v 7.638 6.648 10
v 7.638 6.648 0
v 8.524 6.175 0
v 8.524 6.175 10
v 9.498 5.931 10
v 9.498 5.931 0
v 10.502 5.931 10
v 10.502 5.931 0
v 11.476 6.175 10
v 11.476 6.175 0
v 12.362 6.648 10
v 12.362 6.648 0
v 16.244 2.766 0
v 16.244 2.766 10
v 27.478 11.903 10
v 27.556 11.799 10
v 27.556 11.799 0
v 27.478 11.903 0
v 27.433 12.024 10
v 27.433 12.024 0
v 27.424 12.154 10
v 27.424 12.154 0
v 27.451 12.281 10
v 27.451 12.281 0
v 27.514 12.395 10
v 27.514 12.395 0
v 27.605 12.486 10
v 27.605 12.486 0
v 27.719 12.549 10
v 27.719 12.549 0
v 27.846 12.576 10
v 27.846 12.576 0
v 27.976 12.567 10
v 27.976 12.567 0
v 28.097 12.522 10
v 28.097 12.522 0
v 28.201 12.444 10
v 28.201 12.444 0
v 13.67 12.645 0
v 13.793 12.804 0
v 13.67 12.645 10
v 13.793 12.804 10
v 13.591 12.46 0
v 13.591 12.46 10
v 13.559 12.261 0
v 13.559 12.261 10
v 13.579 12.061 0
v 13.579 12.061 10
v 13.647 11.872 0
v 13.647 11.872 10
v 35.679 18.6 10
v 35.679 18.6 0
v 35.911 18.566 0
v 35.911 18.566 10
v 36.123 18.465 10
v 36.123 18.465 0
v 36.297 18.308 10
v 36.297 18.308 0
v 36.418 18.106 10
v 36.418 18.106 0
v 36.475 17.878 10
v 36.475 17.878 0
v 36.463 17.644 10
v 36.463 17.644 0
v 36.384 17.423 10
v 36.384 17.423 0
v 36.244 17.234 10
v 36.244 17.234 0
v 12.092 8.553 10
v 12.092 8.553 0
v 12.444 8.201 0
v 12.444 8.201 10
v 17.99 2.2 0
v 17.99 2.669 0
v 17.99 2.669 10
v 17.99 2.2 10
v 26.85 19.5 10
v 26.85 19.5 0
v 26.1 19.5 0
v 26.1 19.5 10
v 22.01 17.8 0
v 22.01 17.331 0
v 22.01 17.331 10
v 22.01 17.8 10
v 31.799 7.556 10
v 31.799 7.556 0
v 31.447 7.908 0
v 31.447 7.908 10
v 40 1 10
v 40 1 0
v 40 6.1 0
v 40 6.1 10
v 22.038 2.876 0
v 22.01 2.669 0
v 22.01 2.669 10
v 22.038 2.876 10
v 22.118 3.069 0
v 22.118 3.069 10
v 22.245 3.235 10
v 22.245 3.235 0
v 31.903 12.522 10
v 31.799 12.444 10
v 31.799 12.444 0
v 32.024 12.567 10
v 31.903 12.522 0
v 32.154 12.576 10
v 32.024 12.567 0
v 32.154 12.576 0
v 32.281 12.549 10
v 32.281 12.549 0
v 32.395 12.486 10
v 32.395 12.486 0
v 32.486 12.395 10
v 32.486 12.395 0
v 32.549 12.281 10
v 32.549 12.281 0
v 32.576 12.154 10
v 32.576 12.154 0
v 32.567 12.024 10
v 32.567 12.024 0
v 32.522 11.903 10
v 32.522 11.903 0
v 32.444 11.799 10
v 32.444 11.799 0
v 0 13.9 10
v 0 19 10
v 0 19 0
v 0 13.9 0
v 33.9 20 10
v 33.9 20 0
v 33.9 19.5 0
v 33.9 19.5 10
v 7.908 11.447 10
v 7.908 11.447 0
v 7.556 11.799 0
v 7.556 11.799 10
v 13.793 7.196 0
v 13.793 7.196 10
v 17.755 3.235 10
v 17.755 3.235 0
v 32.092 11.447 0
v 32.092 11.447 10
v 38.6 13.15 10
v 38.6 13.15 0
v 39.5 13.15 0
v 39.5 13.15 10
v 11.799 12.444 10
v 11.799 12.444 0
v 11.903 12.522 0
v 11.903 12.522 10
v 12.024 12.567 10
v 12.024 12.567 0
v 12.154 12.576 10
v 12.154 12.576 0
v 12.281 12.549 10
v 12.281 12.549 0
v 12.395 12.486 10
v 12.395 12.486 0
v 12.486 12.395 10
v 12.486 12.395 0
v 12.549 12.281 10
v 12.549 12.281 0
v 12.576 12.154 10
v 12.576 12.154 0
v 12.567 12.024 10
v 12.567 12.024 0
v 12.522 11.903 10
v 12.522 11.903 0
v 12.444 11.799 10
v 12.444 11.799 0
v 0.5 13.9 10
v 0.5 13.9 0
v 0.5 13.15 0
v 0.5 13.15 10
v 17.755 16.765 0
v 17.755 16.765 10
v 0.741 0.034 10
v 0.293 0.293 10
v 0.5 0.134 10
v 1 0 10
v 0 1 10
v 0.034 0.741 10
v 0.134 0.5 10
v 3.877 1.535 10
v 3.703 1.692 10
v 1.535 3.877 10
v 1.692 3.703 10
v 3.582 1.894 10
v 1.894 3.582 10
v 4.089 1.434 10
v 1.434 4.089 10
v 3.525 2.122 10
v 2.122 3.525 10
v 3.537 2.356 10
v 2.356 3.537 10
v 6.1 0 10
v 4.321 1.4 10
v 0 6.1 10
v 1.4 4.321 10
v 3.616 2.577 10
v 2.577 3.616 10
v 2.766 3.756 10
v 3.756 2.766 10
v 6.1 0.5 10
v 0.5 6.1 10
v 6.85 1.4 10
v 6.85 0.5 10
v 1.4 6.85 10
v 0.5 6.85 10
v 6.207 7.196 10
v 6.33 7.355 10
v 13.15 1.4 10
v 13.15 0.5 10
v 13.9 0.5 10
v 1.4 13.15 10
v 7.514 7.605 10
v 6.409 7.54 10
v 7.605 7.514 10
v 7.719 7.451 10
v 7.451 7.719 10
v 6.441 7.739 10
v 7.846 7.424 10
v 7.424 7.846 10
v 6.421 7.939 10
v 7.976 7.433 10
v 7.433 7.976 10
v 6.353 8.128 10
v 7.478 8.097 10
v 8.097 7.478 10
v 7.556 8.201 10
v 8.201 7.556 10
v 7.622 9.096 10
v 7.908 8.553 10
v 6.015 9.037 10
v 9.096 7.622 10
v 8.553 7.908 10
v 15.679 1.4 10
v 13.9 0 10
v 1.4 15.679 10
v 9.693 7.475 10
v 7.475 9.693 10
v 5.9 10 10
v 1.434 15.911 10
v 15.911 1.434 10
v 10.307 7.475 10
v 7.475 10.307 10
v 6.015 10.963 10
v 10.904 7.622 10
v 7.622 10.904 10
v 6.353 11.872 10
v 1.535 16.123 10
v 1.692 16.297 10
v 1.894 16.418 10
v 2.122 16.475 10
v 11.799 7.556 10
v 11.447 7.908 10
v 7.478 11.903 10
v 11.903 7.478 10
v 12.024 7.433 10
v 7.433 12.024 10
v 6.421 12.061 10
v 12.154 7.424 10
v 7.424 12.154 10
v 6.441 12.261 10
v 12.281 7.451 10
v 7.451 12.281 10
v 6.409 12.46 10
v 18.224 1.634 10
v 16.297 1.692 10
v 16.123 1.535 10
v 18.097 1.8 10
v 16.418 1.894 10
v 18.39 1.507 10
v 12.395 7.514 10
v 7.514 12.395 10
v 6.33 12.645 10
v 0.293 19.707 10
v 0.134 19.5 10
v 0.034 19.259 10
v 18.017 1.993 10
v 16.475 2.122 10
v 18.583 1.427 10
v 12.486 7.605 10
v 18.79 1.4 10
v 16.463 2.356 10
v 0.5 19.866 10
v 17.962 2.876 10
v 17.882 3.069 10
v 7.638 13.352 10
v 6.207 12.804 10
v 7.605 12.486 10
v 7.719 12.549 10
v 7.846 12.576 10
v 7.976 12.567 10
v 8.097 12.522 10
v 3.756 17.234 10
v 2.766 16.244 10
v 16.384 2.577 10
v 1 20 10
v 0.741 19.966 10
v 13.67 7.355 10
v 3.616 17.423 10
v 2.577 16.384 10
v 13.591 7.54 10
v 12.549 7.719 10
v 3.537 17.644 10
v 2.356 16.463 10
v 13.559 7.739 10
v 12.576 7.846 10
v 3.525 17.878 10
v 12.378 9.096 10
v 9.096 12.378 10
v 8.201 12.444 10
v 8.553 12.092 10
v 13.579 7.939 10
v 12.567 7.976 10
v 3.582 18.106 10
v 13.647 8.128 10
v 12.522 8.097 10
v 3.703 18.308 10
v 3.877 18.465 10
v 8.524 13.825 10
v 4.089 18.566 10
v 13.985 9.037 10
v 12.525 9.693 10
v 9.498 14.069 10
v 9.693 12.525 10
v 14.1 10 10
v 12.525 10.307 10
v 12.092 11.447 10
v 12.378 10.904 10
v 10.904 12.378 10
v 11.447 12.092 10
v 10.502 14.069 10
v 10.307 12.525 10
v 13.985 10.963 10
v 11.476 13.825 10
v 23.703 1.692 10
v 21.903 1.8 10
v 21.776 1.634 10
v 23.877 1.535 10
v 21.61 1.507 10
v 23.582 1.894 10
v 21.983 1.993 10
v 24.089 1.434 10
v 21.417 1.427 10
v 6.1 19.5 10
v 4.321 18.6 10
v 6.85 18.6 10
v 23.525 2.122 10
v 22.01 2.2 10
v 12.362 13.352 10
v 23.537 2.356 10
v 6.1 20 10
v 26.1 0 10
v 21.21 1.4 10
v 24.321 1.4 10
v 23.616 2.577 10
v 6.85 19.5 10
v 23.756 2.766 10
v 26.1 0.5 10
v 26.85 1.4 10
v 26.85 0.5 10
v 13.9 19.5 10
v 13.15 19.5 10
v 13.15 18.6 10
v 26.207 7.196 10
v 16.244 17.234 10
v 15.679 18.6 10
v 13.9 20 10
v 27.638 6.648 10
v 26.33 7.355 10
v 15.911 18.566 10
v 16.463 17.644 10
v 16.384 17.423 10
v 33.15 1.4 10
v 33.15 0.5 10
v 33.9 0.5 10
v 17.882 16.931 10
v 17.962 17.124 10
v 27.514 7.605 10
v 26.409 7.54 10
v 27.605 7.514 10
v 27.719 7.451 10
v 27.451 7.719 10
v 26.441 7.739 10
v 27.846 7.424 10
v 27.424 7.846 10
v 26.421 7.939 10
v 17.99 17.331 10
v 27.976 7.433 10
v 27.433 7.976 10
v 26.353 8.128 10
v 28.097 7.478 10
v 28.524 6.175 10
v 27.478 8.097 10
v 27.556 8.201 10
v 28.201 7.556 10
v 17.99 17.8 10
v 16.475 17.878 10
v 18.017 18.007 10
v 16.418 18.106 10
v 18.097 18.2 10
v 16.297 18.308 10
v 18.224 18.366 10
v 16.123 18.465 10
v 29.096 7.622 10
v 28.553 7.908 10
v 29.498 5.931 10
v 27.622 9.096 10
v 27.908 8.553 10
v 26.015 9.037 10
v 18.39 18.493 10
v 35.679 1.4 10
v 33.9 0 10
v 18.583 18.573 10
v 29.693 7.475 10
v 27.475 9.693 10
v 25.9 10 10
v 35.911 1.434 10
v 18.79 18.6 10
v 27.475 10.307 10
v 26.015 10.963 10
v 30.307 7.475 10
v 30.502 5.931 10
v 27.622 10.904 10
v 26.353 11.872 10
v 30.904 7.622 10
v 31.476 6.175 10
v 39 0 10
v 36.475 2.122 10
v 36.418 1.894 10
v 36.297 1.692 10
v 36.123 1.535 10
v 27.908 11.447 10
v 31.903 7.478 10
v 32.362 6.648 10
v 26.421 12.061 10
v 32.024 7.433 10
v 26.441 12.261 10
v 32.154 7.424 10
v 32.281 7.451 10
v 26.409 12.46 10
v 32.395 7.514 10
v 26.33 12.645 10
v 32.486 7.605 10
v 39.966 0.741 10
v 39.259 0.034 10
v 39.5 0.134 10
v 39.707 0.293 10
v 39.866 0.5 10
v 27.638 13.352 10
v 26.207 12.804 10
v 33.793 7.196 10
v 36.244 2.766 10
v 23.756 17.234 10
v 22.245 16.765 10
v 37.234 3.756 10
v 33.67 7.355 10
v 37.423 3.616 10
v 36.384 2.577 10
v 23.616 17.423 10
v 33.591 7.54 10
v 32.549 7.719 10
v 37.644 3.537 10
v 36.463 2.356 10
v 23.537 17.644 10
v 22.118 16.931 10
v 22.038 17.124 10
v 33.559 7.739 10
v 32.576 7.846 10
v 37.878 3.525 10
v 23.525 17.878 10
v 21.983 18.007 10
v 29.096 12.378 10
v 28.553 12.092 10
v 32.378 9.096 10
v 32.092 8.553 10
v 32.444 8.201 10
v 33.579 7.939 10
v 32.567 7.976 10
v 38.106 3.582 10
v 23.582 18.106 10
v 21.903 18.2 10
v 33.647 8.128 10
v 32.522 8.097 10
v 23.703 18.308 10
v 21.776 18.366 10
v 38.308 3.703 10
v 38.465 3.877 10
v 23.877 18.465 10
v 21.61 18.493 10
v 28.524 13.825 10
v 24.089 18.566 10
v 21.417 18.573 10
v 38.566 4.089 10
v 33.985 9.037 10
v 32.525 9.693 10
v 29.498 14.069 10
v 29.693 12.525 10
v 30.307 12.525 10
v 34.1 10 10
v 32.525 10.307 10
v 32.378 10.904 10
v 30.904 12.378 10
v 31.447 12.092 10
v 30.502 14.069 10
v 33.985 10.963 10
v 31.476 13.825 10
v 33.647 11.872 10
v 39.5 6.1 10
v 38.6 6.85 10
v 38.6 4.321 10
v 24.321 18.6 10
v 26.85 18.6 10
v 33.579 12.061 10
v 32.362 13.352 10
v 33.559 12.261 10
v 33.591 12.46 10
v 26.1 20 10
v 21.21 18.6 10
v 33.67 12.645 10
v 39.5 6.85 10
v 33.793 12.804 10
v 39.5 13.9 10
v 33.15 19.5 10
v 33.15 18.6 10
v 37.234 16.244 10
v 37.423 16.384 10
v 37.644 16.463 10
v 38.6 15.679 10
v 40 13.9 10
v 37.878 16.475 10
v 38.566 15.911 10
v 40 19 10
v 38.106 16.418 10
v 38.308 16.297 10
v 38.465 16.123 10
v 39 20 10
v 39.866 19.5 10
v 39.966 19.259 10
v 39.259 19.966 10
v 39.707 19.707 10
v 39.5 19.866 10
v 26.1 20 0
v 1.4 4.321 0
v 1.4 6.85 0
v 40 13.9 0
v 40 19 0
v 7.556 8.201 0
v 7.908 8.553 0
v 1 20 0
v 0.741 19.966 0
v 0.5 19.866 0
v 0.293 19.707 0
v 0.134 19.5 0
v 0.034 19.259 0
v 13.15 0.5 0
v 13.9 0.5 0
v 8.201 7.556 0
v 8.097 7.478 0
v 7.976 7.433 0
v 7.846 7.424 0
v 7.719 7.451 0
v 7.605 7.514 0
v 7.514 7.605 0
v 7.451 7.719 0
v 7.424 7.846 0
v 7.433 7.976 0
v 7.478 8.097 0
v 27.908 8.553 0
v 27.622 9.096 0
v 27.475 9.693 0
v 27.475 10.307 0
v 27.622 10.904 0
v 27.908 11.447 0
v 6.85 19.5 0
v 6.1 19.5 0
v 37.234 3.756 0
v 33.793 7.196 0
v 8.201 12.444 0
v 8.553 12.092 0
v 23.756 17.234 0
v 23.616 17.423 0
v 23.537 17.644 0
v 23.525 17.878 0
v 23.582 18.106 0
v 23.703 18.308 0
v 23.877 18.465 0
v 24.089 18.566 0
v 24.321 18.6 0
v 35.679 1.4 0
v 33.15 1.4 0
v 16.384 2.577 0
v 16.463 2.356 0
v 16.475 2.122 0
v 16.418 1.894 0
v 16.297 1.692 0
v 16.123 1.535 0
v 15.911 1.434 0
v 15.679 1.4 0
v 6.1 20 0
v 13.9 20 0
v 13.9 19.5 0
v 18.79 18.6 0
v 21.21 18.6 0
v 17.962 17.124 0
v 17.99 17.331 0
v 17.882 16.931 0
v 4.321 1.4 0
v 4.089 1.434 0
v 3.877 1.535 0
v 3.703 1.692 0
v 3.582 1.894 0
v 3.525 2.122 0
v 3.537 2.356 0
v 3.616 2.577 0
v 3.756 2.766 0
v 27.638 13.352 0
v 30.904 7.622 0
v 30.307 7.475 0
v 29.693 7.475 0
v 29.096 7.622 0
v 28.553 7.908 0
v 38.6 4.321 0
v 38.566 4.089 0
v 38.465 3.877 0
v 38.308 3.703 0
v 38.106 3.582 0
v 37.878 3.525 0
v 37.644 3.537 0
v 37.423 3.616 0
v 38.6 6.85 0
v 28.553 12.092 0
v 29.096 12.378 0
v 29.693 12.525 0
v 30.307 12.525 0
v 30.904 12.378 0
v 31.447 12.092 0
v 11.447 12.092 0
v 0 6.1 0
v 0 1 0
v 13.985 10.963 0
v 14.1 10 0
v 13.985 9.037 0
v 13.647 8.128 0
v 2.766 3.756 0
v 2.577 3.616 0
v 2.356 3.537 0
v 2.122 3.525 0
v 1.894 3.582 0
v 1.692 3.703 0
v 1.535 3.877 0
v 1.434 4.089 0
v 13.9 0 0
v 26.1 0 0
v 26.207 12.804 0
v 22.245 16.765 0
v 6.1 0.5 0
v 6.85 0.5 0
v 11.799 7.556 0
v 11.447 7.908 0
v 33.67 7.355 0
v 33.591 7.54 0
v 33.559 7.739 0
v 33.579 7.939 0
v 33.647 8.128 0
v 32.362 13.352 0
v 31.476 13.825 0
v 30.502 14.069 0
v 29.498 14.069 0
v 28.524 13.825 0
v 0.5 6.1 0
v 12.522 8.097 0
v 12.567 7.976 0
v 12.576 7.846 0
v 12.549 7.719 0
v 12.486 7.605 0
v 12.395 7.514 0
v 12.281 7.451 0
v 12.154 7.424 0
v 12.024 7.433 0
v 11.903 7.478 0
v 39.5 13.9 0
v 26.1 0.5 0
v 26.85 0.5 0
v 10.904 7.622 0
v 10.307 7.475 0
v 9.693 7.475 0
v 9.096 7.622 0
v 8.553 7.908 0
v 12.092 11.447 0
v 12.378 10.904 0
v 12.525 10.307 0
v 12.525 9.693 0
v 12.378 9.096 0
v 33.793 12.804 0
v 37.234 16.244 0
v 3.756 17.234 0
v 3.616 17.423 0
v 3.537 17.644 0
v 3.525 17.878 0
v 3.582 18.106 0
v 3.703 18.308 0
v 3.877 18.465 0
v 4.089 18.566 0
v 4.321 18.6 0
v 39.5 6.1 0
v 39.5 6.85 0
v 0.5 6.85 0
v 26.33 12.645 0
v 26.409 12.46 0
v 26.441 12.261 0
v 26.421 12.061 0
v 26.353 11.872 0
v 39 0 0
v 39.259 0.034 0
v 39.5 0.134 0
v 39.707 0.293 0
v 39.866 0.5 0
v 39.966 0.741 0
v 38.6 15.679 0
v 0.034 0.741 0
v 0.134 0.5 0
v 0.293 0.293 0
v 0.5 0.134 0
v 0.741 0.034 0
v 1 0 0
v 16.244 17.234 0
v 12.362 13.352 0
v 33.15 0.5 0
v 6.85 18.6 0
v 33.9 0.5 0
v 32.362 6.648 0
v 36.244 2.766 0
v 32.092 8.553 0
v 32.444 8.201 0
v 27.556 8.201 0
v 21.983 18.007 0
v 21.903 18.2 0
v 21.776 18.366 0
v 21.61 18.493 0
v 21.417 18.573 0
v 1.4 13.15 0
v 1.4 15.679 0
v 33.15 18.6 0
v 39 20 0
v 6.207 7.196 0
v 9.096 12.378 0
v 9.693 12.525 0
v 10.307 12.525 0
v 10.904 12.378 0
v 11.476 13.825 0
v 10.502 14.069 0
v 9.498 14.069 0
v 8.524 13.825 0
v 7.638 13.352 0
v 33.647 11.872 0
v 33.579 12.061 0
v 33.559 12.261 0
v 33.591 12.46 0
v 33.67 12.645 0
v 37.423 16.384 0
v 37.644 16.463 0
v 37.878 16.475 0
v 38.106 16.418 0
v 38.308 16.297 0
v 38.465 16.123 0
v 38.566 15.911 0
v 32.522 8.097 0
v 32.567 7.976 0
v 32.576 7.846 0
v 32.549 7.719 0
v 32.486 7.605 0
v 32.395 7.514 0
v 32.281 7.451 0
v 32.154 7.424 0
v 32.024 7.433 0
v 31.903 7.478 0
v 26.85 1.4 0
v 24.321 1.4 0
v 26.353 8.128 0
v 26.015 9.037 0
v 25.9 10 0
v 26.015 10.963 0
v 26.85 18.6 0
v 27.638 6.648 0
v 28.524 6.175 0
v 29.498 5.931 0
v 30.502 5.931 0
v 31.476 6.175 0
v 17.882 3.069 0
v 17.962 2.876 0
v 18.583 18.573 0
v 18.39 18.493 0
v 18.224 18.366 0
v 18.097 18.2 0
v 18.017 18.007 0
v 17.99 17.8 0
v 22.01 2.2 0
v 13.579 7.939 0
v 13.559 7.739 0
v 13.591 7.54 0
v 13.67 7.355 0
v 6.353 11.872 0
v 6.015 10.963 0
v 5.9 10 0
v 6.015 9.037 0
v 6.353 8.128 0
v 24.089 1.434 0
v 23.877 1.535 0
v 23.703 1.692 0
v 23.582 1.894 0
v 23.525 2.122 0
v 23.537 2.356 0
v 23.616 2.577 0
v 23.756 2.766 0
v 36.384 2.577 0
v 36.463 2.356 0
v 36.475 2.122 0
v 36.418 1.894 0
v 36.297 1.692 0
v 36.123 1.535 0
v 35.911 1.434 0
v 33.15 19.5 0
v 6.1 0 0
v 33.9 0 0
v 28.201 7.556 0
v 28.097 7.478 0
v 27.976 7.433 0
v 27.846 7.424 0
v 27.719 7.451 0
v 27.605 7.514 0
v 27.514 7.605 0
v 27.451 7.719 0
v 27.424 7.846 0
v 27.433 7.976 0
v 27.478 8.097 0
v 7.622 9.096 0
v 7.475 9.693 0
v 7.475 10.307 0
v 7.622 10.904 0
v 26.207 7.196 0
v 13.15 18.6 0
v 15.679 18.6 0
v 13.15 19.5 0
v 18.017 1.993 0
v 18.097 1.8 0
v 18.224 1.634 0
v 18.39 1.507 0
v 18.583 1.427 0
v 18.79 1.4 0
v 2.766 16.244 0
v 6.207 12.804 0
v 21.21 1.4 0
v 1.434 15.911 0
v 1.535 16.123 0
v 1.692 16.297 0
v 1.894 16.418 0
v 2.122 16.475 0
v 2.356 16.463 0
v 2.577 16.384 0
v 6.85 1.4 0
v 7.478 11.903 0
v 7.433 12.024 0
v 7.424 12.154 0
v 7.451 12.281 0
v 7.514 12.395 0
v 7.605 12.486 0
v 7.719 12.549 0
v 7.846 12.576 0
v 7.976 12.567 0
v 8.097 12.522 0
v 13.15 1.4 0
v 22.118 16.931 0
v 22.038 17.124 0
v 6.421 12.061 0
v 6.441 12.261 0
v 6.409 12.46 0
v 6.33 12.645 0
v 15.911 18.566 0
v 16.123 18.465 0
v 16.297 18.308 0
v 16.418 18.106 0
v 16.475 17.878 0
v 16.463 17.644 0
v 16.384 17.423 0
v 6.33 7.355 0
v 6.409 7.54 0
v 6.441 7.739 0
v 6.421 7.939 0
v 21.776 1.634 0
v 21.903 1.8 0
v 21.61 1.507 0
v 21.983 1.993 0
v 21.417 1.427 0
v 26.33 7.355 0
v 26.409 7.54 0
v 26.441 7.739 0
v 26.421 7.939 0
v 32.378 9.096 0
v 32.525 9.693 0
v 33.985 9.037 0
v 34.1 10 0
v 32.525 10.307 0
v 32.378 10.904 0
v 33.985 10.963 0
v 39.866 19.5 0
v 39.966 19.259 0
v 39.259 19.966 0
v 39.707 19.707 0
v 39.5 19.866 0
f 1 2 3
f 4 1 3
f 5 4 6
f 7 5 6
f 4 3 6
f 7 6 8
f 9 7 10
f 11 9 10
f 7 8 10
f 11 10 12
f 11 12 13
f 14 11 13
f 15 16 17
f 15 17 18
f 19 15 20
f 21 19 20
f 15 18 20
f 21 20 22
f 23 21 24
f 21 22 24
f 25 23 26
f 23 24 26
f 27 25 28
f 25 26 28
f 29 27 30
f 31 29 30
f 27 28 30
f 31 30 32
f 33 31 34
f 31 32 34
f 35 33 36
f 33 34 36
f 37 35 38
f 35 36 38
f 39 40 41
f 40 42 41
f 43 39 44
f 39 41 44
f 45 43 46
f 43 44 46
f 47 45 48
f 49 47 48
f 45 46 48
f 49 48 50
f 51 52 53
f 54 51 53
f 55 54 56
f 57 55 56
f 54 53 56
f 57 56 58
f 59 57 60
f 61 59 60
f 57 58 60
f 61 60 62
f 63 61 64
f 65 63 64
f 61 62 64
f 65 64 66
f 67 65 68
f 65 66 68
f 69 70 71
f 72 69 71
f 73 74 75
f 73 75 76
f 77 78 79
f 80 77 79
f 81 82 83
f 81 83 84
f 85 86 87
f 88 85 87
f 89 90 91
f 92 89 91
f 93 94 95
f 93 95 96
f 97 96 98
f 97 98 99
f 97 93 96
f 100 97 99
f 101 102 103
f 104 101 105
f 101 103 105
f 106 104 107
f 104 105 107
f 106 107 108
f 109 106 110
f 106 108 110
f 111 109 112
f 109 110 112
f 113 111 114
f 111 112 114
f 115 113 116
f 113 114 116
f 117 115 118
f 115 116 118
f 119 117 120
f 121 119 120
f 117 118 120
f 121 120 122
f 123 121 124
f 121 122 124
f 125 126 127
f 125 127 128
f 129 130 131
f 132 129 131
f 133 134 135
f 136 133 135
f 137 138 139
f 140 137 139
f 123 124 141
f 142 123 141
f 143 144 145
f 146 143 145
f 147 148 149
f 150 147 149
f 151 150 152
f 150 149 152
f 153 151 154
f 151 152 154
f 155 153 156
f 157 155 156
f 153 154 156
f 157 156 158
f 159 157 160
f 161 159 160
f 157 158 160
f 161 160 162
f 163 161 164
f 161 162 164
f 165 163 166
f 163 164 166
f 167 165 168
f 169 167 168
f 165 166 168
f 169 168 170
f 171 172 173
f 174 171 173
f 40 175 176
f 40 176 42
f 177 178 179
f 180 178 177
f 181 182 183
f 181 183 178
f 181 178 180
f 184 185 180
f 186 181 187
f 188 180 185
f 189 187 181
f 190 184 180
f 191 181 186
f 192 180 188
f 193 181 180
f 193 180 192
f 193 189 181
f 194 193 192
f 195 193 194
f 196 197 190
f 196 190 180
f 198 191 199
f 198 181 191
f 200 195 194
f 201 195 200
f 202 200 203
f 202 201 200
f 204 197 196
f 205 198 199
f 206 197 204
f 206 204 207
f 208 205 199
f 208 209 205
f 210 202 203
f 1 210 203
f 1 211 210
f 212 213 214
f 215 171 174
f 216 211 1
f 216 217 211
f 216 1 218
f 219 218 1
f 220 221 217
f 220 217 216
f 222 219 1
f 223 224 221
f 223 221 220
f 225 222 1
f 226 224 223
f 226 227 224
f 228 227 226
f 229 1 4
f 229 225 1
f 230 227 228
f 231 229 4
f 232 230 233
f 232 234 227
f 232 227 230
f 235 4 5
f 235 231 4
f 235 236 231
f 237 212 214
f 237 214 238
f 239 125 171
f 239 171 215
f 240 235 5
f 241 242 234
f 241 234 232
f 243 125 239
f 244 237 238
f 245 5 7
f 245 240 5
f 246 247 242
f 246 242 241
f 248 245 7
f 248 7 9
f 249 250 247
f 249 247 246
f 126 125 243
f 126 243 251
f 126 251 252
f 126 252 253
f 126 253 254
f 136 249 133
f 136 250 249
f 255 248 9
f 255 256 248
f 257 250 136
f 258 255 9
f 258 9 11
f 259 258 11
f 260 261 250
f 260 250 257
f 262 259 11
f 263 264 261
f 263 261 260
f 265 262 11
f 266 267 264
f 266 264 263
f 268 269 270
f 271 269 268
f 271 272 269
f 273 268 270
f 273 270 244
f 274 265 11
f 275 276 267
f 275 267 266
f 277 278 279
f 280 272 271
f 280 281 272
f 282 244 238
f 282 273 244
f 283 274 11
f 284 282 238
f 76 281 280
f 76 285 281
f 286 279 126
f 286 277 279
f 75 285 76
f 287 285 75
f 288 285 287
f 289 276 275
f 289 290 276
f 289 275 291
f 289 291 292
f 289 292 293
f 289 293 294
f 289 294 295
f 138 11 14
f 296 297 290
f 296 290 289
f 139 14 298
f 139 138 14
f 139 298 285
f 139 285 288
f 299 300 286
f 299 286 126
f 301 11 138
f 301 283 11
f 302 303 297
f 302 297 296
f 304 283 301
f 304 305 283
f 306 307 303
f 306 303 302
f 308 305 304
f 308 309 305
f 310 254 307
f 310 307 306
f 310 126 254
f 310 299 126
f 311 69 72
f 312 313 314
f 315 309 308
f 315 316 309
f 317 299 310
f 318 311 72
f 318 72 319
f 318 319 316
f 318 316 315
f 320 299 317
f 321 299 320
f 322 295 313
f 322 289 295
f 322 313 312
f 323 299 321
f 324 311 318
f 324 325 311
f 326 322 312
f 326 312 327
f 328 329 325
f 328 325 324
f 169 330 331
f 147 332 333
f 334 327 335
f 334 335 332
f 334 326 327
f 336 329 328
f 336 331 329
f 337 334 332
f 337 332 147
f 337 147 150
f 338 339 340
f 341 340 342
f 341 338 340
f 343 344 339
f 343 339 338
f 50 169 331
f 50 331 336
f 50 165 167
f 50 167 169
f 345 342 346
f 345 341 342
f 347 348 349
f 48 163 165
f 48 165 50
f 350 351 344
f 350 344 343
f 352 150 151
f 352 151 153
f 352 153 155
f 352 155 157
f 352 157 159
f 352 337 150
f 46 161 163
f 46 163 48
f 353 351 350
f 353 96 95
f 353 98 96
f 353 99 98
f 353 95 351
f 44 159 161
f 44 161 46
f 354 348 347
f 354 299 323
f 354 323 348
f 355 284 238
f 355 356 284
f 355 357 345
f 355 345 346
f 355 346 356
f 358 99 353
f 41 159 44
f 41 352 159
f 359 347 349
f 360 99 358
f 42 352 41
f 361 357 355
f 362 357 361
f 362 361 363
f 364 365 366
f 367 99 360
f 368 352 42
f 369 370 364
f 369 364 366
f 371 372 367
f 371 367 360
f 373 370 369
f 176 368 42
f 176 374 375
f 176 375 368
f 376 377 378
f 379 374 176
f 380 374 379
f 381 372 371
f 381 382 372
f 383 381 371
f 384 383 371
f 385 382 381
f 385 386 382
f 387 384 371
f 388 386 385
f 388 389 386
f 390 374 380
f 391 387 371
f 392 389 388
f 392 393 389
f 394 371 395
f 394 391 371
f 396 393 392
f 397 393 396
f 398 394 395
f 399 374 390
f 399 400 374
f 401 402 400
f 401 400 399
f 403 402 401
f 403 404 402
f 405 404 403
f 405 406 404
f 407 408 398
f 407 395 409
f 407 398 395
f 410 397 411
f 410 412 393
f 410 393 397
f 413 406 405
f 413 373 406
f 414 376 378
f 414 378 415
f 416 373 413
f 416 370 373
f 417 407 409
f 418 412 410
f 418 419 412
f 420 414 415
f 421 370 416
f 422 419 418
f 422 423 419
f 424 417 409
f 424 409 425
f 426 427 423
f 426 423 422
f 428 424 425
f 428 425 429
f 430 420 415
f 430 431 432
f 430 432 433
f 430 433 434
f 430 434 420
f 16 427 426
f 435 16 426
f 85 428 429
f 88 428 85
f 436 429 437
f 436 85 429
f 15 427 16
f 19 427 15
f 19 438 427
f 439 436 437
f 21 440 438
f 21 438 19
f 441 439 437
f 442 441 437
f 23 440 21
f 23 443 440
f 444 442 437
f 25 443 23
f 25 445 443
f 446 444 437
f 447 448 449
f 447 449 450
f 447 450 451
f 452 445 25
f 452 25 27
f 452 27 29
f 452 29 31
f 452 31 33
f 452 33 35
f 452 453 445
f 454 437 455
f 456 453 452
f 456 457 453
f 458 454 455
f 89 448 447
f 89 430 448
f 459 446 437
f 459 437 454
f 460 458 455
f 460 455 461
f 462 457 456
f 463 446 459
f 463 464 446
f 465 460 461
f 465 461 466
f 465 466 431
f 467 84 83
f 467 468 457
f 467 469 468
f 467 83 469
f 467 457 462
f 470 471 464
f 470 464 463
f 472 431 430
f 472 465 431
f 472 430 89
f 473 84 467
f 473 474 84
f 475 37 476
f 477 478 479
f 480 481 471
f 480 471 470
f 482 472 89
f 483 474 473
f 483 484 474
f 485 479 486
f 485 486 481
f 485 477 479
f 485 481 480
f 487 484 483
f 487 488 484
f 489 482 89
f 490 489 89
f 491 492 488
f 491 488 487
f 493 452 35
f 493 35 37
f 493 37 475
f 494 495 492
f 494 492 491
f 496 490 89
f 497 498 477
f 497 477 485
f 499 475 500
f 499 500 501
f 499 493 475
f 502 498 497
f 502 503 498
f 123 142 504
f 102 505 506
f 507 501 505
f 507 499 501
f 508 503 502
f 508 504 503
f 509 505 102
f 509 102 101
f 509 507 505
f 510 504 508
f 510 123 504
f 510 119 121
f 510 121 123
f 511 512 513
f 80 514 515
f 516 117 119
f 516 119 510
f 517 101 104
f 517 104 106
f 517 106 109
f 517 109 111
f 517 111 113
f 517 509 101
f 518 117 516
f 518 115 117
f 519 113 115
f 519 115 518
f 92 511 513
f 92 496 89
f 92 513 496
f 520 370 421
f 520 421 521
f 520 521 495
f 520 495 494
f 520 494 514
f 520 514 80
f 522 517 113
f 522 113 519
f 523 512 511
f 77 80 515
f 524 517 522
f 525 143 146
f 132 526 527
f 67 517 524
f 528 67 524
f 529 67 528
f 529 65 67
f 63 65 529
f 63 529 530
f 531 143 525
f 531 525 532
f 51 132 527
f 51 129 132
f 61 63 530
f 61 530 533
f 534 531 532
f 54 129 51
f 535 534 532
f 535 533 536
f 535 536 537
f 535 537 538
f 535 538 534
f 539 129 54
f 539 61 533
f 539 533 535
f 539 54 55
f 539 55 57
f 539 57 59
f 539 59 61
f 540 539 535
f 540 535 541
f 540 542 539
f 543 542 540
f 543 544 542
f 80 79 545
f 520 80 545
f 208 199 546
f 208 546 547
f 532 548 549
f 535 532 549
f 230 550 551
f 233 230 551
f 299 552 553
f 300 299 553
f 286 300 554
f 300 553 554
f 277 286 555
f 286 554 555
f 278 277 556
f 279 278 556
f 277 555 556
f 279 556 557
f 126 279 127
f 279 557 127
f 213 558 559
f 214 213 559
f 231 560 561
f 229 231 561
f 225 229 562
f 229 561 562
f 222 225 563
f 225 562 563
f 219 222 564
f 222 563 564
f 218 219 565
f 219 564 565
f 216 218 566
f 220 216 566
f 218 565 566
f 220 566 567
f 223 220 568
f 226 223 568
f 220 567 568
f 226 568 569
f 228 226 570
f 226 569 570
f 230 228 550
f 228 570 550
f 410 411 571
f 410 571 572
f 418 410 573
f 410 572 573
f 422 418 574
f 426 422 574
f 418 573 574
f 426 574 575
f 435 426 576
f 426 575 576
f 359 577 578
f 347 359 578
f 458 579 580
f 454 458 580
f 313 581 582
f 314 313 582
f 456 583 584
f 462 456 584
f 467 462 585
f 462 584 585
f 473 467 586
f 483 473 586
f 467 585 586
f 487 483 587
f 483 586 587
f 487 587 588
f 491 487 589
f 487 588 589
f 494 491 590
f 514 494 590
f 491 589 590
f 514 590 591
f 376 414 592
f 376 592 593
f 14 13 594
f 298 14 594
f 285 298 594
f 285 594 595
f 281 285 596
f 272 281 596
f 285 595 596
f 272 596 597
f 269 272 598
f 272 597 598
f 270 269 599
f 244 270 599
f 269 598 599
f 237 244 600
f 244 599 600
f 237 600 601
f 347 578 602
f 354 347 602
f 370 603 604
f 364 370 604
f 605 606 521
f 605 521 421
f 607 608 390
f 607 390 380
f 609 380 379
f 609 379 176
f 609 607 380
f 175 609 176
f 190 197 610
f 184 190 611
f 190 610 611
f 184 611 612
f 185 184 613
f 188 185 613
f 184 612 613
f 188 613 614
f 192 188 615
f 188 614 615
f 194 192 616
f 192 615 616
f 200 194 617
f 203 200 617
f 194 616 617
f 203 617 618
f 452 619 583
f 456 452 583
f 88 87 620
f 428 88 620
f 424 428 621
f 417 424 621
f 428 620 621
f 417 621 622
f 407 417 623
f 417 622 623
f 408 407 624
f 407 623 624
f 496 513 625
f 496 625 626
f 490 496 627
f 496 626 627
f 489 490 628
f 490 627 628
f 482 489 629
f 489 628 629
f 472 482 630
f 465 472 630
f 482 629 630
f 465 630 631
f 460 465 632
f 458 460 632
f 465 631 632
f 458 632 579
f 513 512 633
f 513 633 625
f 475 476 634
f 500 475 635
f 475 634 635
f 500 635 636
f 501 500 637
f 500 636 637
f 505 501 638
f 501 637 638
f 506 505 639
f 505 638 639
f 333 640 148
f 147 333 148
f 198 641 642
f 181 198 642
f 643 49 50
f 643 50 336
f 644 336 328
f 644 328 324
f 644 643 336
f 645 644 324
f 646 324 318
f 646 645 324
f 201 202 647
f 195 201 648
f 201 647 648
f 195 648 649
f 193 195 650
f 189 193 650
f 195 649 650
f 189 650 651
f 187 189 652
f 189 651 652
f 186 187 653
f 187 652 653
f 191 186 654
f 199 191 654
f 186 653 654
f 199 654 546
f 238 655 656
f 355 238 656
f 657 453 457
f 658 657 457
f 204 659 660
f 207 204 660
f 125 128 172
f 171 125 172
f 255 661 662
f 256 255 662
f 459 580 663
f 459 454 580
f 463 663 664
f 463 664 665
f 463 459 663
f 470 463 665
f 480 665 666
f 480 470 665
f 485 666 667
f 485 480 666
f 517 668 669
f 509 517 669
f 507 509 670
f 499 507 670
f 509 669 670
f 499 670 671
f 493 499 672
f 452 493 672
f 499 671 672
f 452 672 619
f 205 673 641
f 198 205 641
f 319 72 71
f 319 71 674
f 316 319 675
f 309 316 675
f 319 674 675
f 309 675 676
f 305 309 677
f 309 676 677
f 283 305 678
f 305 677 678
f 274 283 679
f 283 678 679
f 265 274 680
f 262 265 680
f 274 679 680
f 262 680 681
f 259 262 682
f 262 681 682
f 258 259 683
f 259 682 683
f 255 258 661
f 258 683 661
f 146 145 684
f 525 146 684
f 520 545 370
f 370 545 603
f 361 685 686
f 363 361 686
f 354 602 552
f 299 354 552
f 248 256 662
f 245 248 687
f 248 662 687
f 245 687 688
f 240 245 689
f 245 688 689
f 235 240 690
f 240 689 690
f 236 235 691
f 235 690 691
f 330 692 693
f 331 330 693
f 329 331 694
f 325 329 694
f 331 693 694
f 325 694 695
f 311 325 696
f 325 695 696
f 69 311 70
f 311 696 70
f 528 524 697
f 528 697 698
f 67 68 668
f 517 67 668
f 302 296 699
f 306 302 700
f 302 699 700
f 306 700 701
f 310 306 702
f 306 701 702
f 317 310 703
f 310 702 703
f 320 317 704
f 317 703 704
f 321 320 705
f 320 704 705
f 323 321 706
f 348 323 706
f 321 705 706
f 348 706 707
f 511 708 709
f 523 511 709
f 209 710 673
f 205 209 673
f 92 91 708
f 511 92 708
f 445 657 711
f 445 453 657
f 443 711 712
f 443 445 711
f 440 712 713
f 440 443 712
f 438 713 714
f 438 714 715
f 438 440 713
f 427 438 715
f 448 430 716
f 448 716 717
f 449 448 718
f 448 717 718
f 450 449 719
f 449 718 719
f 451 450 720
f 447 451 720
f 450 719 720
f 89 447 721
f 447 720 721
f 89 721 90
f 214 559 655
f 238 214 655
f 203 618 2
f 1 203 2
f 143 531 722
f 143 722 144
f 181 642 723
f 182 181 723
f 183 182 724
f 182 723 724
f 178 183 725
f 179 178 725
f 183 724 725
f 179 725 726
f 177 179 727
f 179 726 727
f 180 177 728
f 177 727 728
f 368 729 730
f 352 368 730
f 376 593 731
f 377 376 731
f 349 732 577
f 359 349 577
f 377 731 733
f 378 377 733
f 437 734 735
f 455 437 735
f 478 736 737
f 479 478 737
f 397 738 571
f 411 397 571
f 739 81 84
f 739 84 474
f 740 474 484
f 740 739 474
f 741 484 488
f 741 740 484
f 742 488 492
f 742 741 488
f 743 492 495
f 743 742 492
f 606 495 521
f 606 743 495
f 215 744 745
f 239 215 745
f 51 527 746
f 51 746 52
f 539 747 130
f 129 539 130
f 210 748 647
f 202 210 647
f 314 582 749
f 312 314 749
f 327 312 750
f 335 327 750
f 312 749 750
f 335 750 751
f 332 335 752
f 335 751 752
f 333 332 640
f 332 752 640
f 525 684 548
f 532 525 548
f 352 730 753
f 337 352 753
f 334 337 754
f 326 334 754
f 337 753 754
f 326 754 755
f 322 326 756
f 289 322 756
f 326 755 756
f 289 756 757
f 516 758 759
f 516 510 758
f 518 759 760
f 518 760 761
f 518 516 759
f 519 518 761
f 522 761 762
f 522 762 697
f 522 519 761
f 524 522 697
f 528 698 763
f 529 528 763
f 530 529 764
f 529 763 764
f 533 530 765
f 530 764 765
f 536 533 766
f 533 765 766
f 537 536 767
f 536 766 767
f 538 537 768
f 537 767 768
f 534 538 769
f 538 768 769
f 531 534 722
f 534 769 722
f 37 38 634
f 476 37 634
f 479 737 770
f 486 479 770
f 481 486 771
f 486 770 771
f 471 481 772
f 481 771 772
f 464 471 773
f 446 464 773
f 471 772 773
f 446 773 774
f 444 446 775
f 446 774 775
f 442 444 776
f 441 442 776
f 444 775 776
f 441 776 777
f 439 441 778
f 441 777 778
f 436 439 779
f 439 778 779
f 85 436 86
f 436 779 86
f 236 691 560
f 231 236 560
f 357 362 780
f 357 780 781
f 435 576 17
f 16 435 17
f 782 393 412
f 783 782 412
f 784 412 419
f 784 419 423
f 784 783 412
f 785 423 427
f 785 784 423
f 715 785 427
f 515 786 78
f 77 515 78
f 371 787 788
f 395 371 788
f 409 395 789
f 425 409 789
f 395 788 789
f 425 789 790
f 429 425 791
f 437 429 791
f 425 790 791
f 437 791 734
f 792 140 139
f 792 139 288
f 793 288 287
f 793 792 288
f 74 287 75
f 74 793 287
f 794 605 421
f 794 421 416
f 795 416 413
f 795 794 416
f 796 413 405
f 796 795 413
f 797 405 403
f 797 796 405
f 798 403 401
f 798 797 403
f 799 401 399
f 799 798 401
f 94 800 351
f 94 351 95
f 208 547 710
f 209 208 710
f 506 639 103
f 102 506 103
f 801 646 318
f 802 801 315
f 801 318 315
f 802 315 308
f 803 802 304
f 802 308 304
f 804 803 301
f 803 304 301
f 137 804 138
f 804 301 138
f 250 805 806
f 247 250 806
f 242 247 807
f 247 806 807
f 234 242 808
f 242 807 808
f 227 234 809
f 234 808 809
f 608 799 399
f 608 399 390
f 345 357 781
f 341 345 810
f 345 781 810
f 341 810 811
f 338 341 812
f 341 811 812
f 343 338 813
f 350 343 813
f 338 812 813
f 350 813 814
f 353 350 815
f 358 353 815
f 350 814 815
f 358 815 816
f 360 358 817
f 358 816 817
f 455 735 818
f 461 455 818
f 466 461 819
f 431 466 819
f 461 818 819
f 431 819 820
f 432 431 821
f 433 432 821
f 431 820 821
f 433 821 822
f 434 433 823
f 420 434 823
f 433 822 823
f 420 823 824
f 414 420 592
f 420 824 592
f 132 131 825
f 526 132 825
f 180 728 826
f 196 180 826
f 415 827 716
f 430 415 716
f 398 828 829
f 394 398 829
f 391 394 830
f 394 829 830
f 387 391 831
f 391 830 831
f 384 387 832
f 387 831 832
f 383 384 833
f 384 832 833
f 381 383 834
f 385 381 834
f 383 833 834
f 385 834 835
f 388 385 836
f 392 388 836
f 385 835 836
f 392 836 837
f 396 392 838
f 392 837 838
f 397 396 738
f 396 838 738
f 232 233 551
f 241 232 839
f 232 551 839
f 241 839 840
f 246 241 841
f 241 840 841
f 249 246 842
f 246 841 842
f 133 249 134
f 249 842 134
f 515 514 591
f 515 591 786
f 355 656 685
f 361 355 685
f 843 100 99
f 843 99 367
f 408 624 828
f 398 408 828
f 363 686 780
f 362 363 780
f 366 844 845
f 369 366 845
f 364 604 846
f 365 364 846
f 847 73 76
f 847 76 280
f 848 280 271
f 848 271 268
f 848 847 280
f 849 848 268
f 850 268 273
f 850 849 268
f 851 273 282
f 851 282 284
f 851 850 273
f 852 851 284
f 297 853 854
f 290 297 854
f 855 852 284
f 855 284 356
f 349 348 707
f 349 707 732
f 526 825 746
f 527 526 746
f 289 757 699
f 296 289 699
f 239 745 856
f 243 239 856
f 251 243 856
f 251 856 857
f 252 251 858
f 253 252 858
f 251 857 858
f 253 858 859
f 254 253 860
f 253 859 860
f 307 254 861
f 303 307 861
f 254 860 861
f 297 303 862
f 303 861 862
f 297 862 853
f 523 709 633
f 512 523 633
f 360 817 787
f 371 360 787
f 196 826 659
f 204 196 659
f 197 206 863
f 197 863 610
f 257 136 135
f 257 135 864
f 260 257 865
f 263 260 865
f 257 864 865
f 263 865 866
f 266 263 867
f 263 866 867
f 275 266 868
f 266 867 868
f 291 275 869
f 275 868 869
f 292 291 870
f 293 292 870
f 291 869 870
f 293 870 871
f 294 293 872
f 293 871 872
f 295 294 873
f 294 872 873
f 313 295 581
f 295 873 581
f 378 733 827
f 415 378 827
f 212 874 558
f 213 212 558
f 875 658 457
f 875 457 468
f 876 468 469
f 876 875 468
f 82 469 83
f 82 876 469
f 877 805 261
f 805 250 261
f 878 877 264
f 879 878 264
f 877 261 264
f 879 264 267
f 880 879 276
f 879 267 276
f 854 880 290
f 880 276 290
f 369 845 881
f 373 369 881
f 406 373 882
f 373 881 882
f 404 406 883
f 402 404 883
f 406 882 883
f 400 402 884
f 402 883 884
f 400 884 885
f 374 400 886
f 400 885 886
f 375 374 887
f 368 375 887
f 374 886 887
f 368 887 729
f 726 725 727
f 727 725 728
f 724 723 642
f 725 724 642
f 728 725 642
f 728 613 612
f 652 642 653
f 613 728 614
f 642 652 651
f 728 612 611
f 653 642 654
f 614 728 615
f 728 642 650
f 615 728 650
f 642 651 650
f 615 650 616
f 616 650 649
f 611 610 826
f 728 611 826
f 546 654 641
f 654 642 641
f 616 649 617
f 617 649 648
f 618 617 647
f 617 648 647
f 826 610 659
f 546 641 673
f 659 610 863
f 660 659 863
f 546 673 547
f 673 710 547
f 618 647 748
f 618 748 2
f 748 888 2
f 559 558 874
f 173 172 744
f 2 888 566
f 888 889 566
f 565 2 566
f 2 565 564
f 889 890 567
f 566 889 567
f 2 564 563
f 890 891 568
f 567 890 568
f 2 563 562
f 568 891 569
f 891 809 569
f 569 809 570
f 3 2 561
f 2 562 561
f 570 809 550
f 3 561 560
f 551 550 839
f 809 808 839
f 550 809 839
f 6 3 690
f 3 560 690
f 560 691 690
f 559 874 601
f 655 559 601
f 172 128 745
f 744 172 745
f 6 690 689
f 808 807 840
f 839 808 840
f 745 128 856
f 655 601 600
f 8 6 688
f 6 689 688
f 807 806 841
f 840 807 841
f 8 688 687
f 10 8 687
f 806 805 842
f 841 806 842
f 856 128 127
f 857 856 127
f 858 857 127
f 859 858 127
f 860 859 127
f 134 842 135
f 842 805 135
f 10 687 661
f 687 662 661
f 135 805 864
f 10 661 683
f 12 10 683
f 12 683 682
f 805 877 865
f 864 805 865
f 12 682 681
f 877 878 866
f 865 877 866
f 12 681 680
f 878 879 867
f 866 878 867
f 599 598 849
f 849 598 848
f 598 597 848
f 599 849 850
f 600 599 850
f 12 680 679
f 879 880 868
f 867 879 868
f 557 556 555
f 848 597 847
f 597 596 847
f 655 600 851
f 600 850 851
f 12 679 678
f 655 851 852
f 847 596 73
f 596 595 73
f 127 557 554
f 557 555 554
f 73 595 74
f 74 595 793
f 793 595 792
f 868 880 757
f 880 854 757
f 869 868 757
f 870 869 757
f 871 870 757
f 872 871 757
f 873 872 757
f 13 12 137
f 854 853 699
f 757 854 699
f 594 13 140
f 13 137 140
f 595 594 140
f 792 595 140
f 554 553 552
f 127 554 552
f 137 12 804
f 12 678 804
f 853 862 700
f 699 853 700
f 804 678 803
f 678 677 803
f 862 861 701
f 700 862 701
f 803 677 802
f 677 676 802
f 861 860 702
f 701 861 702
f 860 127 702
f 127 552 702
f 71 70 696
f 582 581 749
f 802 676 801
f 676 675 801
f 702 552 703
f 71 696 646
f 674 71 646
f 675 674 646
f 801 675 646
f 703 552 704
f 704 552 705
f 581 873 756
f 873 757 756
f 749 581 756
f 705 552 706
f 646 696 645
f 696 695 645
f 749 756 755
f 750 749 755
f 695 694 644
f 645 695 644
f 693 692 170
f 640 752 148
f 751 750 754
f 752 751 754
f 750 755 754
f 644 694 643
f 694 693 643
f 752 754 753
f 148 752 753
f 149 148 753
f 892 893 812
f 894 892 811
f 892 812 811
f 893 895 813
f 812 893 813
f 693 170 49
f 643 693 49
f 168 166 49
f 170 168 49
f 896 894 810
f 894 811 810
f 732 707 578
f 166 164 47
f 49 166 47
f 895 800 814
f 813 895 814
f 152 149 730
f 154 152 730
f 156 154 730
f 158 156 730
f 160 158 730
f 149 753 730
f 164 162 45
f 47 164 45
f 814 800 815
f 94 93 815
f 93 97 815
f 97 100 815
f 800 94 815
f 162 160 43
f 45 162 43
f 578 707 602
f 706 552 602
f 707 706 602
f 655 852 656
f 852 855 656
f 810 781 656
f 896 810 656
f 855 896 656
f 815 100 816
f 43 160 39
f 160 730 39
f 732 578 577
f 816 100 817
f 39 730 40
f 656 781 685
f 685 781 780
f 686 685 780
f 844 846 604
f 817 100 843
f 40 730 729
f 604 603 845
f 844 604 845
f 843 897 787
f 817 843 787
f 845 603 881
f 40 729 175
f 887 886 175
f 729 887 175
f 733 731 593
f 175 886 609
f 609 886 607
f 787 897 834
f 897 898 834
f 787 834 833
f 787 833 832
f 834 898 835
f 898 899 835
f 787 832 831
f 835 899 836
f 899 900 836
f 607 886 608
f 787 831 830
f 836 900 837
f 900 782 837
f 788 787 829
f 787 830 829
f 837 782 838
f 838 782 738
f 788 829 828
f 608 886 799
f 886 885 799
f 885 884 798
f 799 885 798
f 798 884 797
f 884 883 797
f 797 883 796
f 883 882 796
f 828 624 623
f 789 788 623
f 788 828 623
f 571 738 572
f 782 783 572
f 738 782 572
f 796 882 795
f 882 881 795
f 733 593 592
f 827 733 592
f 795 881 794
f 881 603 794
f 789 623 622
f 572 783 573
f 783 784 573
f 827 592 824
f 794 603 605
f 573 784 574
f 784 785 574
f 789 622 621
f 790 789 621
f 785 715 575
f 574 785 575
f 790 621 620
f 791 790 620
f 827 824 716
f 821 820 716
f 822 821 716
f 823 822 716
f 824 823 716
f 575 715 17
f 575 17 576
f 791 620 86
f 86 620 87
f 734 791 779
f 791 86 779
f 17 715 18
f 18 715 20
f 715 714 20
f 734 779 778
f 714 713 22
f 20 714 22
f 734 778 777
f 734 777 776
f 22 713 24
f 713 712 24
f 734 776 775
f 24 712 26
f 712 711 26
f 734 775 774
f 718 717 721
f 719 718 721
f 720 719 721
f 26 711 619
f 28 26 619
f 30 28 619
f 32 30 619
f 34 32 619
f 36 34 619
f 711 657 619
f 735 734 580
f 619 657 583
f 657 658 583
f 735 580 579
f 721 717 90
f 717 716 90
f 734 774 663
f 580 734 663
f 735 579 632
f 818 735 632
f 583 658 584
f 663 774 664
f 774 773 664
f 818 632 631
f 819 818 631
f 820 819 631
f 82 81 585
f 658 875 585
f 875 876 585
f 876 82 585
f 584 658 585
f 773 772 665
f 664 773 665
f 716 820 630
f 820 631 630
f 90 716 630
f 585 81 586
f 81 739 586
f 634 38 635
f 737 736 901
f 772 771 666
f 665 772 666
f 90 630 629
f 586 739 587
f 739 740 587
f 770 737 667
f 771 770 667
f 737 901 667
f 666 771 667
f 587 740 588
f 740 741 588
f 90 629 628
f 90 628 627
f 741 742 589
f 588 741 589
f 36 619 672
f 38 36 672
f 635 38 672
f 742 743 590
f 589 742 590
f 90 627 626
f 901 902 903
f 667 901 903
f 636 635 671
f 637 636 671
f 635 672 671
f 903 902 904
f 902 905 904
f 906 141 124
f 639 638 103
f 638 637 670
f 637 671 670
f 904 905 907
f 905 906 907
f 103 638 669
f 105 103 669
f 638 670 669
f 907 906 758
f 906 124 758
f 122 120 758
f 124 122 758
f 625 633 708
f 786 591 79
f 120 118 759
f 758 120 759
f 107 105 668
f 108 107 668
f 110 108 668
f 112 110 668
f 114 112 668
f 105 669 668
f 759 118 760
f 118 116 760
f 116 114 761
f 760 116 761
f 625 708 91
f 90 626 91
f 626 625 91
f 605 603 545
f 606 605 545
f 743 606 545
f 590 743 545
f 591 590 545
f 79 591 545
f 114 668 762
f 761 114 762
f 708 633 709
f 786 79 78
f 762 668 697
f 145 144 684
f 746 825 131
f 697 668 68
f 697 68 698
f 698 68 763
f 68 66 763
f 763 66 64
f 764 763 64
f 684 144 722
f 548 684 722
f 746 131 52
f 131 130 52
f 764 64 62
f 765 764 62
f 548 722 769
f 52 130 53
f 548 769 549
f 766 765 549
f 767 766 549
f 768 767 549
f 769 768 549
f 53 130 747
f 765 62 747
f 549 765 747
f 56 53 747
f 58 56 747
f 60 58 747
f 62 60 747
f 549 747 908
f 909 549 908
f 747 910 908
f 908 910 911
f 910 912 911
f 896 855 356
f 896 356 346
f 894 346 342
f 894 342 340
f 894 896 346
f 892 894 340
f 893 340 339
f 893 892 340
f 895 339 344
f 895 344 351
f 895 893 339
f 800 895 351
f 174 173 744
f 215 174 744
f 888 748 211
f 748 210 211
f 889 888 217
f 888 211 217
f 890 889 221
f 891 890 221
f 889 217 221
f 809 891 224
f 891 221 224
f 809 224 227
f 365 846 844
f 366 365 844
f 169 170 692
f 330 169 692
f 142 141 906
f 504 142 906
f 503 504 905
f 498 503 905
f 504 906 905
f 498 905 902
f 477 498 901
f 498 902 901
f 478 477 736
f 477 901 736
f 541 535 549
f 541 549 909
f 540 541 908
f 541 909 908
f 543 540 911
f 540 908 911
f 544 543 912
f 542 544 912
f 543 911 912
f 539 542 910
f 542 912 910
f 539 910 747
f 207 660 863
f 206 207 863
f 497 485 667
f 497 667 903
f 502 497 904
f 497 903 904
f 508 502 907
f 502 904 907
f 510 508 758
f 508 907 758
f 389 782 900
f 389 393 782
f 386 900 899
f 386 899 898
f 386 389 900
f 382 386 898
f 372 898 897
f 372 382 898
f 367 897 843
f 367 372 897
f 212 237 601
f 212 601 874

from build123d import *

# Parameters (mm, degrees)
Y_KSEKLIK_EKSTR_ZYON2_DEPTH = 10
RADYUS1_R                   = 0.8


with BuildPart() as part:
    # Çizim3 → Yükseklik-Ekstrüzyon2 (new body)
    with BuildSketch(Plane.XY):
        with BuildLine():
            Line((1, 0), (6.1, 0))
            Line((6.1, 0), (6.1, 0.5))
            Line((6.1, 0.5), (6.85, 0.5))
            Line((6.85, 0.5), (6.85, 1.4))
            Line((6.85, 1.4), (4.321320344, 1.4))
            ThreePointArc((4.321320344, 1.4), (3.582216718, 1.893853254), (3.755634919, 2.765685425))
            Line((3.755634919, 2.765685425), (7.638403375, 6.648453882))
            ThreePointArc((7.638403375, 6.648453882), (10, 5.9), (12.361596625, 6.648453882))
            Line((12.361596625, 6.648453882), (16.244365081, 2.765685425))
            ThreePointArc((16.244365081, 2.765685425), (16.417783282, 1.893853254), (15.678679656, 1.4))
            Line((15.678679656, 1.4), (13.15, 1.4))
            Line((13.15, 1.4), (13.15, 0.5))
            Line((13.15, 0.5), (13.9, 0.5))
            Line((13.9, 0.5), (13.9, 0))
            Line((13.9, 0), (26.1, 0))
            Line((26.1, 0), (26.1, 0.5))
            Line((26.1, 0.5), (26.85, 0.5))
            Line((26.85, 0.5), (26.85, 1.4))
            Line((26.85, 1.4), (24.321320344, 1.4))
            ThreePointArc((24.321320344, 1.4), (23.582216718, 1.893853254), (23.755634919, 2.765685425))
            Line((23.755634919, 2.765685425), (27.638403375, 6.648453882))
            ThreePointArc((27.638403375, 6.648453882), (30, 5.9), (32.361596625, 6.648453882))
            Line((32.361596625, 6.648453882), (36.244365081, 2.765685425))
            ThreePointArc((36.244365081, 2.765685425), (36.417783282, 1.893853254), (35.678679656, 1.4))
            Line((35.678679656, 1.4), (33.15, 1.4))
            Line((33.15, 1.4), (33.15, 0.5))
            Line((33.15, 0.5), (33.9, 0.5))
            Line((33.9, 0.5), (33.9, 0))
            Line((33.9, 0), (39, 0))
            ThreePointArc((39, 0), (39.707106781, 0.292893219), (40, 1))
            Line((40, 1), (40, 6.1))
            Line((40, 6.1), (39.5, 6.1))
            Line((39.5, 6.1), (39.5, 6.85))
            Line((39.5, 6.85), (38.6, 6.85))
            Line((38.6, 6.85), (38.6, 4.321320344))
            ThreePointArc((38.6, 4.321320344), (38.106146746, 3.582216718), (37.234314575, 3.755634919))
            Line((37.234314575, 3.755634919), (33.351546118, 7.638403375))
            ThreePointArc((33.351546118, 7.638403375), (34.1, 10), (33.351546118, 12.361596625))
            Line((33.351546118, 12.361596625), (37.234314575, 16.244365081))
            ThreePointArc((37.234314575, 16.244365081), (38.106146746, 16.417783282), (38.6, 15.678679656))
            Line((38.6, 15.678679656), (38.6, 13.15))
            Line((38.6, 13.15), (39.5, 13.15))
            Line((39.5, 13.15), (39.5, 13.9))
            Line((39.5, 13.9), (40, 13.9))
            Line((40, 13.9), (40, 19))
            ThreePointArc((40, 19), (39.707106781, 19.707106781), (39, 20))
            Line((39, 20), (33.9, 20))
            Line((33.9, 20), (33.9, 19.5))
            Line((33.9, 19.5), (33.15, 19.5))
            Line((33.15, 19.5), (33.15, 18.6))
            Line((33.15, 18.6), (35.678679656, 18.6))
            ThreePointArc((35.678679656, 18.6), (36.417783282, 18.106146746), (36.244365081, 17.234314575))
            Line((36.244365081, 17.234314575), (32.361596625, 13.351546118))
            ThreePointArc((32.361596625, 13.351546118), (30, 14.1), (27.638403375, 13.351546118))
            Line((27.638403375, 13.351546118), (23.755634919, 17.234314575))
            ThreePointArc((23.755634919, 17.234314575), (23.582216718, 18.106146746), (24.321320344, 18.6))
            Line((24.321320344, 18.6), (26.85, 18.6))
            Line((26.85, 18.6), (26.85, 19.5))
            Line((26.85, 19.5), (26.1, 19.5))
            Line((26.1, 19.5), (26.1, 20))
            Line((26.1, 20), (13.9, 20))
            Line((13.9, 20), (13.9, 19.5))
            Line((13.9, 19.5), (13.15, 19.5))
            Line((13.15, 19.5), (13.15, 18.6))
            Line((13.15, 18.6), (15.678679656, 18.6))
            ThreePointArc((15.678679656, 18.6), (16.417783282, 18.106146746), (16.244365081, 17.234314575))
            Line((16.244365081, 17.234314575), (12.361596625, 13.351546118))
            ThreePointArc((12.361596625, 13.351546118), (10, 14.1), (7.638403375, 13.351546118))
            Line((7.638403375, 13.351546118), (3.755634919, 17.234314575))
            ThreePointArc((3.755634919, 17.234314575), (3.582216718, 18.106146746), (4.321320344, 18.6))
            Line((4.321320344, 18.6), (6.85, 18.6))
            Line((6.85, 18.6), (6.85, 19.5))
            Line((6.85, 19.5), (6.1, 19.5))
            Line((6.1, 19.5), (6.1, 20))
            Line((6.1, 20), (1, 20))
            ThreePointArc((1, 20), (0.292893219, 19.707106781), (0, 19))
            Line((0, 19), (0, 13.9))
            Line((0, 13.9), (0.5, 13.9))
            Line((0.5, 13.9), (0.5, 13.15))
            Line((0.5, 13.15), (1.4, 13.15))
            Line((1.4, 13.15), (1.4, 15.678679656))
            ThreePointArc((1.4, 15.678679656), (1.893853254, 16.417783282), (2.765685425, 16.244365081))
            Line((2.765685425, 16.244365081), (6.648453882, 12.361596625))
            ThreePointArc((6.648453882, 12.361596625), (5.9, 10), (6.648453882, 7.638403375))
            Line((6.648453882, 7.638403375), (2.765685425, 3.755634919))
            ThreePointArc((2.765685425, 3.755634919), (1.893853254, 3.582216718), (1.4, 4.321320344))
            Line((1.4, 4.321320344), (1.4, 6.85))
            Line((1.4, 6.85), (0.5, 6.85))
            Line((0.5, 6.85), (0.5, 6.1))
            Line((0.5, 6.1), (0, 6.1))
            Line((0, 6.1), (0, 1))
            ThreePointArc((0, 1), (0.292893219, 0.292893219), (1, 0))
        make_face()
        with BuildLine():
            Line((21.210320913, 18.6), (18.789679087, 18.6))
            ThreePointArc((18.789679087, 18.6), (18.223993662, 18.365685425), (17.989679087, 17.8))
            Line((17.989679087, 17.8), (17.989679087, 17.331100443))
            ThreePointArc((17.989679087, 17.331100443), (17.928782713, 17.024953697), (17.755364512, 16.765415018))
            Line((17.755364512, 16.765415018), (13.351546118, 12.361596625))
            ThreePointArc((13.351546118, 12.361596625), (14.1, 10), (13.351546118, 7.638403375))
            Line((13.351546118, 7.638403375), (17.755364512, 3.234584982))
            ThreePointArc((17.755364512, 3.234584982), (17.928782713, 2.975046303), (17.989679087, 2.668899557))
            Line((17.989679087, 2.668899557), (17.989679087, 2.2))
            ThreePointArc((17.989679087, 2.2), (18.223993662, 1.634314575), (18.789679087, 1.4))
            Line((18.789679087, 1.4), (21.210320913, 1.4))
            ThreePointArc((21.210320913, 1.4), (21.776006338, 1.634314575), (22.010320913, 2.2))
            Line((22.010320913, 2.2), (22.010320913, 2.668899557))
            ThreePointArc((22.010320913, 2.668899557), (22.071217287, 2.975046303), (22.244635488, 3.234584982))
            Line((22.244635488, 3.234584982), (26.648453882, 7.638403375))
            ThreePointArc((26.648453882, 7.638403375), (25.9, 10), (26.648453882, 12.361596625))
            Line((26.648453882, 12.361596625), (22.244635488, 16.765415018))
            ThreePointArc((22.244635488, 16.765415018), (22.071217287, 17.024953697), (22.010320913, 17.331100443))
            Line((22.010320913, 17.331100443), (22.010320913, 17.8))
            ThreePointArc((22.010320913, 17.8), (21.776006338, 18.365685425), (21.210320913, 18.6))
        make_face(mode=Mode.SUBTRACT)
        with BuildLine():
            Line((8.201142588, 12.443783276), (8.552743846, 12.092182018))
            ThreePointArc((8.552743846, 12.092182018), (10, 12.543968548), (11.447256154, 12.092182018))
            Line((11.447256154, 12.092182018), (11.798857412, 12.443783276))
            ThreePointArc((11.798857412, 12.443783276), (12.443783276, 12.443783276), (12.443783276, 11.798857412))
            Line((12.443783276, 11.798857412), (12.092182018, 11.447256154))
            ThreePointArc((12.092182018, 11.447256154), (12.543968548, 10), (12.092182018, 8.552743846))
            Line((12.092182018, 8.552743846), (12.443783276, 8.201142588))
            ThreePointArc((12.443783276, 8.201142588), (12.443783276, 7.556216724), (11.798857412, 7.556216724))
            Line((11.798857412, 7.556216724), (11.447256154, 7.907817982))
            ThreePointArc((11.447256154, 7.907817982), (10, 7.456031452), (8.552743846, 7.907817982))
            Line((8.552743846, 7.907817982), (8.201142588, 7.556216724))
            ThreePointArc((8.201142588, 7.556216724), (7.556216724, 7.556216724), (7.556216724, 8.201142588))
            Line((7.556216724, 8.201142588), (7.907817982, 8.552743846))
            ThreePointArc((7.907817982, 8.552743846), (7.456031452, 10), (7.907817982, 11.447256154))
            Line((7.907817982, 11.447256154), (7.556216724, 11.798857412))
            ThreePointArc((7.556216724, 11.798857412), (7.556216724, 12.443783276), (8.201142588, 12.443783276))
        make_face(mode=Mode.SUBTRACT)
        with BuildLine():
            Line((27.907817982, 11.447256154), (27.556216724, 11.798857412))
            ThreePointArc((27.556216724, 11.798857412), (27.556216724, 12.443783276), (28.201142588, 12.443783276))
            Line((28.201142588, 12.443783276), (28.552743846, 12.092182018))
            ThreePointArc((28.552743846, 12.092182018), (30, 12.543968548), (31.447256154, 12.092182018))
            Line((31.447256154, 12.092182018), (31.798857412, 12.443783276))
            ThreePointArc((31.798857412, 12.443783276), (32.443783276, 12.443783276), (32.443783276, 11.798857412))
            Line((32.443783276, 11.798857412), (32.092182018, 11.447256154))
            ThreePointArc((32.092182018, 11.447256154), (32.543968548, 10), (32.092182018, 8.552743846))
            Line((32.092182018, 8.552743846), (32.443783276, 8.201142588))
            ThreePointArc((32.443783276, 8.201142588), (32.443783276, 7.556216724), (31.798857412, 7.556216724))
            Line((31.798857412, 7.556216724), (31.447256154, 7.907817982))
            ThreePointArc((31.447256154, 7.907817982), (30, 7.456031452), (28.552743846, 7.907817982))
            Line((28.552743846, 7.907817982), (28.201142588, 7.556216724))
            ThreePointArc((28.201142588, 7.556216724), (27.556216724, 7.556216724), (27.556216724, 8.201142588))
            Line((27.556216724, 8.201142588), (27.907817982, 8.552743846))
            ThreePointArc((27.907817982, 8.552743846), (27.456031452, 10), (27.907817982, 11.447256154))
        make_face(mode=Mode.SUBTRACT)
    extrude(amount=Y_KSEKLIK_EKSTR_ZYON2_DEPTH)

    # Radyus1
    radyus1_edges = [part.edges().sort_by_distance(p)[0] for p in [
        (6.648453882, 7.638403375, 5),
        (6.648453882, 12.361596625, 5),
        (33.351546118, 12.361596625, 5),
        (33.351546118, 7.638403375, 5),
        (13.351546118, 12.361596625, 5),
        (13.351546118, 7.638403375, 5),
        (26.648453882, 7.638403375, 5),
        (26.648453882, 12.361596625, 5),
    ]]
    fillet(radyus1_edges, radius=RADYUS1_R)


solid = part.part
